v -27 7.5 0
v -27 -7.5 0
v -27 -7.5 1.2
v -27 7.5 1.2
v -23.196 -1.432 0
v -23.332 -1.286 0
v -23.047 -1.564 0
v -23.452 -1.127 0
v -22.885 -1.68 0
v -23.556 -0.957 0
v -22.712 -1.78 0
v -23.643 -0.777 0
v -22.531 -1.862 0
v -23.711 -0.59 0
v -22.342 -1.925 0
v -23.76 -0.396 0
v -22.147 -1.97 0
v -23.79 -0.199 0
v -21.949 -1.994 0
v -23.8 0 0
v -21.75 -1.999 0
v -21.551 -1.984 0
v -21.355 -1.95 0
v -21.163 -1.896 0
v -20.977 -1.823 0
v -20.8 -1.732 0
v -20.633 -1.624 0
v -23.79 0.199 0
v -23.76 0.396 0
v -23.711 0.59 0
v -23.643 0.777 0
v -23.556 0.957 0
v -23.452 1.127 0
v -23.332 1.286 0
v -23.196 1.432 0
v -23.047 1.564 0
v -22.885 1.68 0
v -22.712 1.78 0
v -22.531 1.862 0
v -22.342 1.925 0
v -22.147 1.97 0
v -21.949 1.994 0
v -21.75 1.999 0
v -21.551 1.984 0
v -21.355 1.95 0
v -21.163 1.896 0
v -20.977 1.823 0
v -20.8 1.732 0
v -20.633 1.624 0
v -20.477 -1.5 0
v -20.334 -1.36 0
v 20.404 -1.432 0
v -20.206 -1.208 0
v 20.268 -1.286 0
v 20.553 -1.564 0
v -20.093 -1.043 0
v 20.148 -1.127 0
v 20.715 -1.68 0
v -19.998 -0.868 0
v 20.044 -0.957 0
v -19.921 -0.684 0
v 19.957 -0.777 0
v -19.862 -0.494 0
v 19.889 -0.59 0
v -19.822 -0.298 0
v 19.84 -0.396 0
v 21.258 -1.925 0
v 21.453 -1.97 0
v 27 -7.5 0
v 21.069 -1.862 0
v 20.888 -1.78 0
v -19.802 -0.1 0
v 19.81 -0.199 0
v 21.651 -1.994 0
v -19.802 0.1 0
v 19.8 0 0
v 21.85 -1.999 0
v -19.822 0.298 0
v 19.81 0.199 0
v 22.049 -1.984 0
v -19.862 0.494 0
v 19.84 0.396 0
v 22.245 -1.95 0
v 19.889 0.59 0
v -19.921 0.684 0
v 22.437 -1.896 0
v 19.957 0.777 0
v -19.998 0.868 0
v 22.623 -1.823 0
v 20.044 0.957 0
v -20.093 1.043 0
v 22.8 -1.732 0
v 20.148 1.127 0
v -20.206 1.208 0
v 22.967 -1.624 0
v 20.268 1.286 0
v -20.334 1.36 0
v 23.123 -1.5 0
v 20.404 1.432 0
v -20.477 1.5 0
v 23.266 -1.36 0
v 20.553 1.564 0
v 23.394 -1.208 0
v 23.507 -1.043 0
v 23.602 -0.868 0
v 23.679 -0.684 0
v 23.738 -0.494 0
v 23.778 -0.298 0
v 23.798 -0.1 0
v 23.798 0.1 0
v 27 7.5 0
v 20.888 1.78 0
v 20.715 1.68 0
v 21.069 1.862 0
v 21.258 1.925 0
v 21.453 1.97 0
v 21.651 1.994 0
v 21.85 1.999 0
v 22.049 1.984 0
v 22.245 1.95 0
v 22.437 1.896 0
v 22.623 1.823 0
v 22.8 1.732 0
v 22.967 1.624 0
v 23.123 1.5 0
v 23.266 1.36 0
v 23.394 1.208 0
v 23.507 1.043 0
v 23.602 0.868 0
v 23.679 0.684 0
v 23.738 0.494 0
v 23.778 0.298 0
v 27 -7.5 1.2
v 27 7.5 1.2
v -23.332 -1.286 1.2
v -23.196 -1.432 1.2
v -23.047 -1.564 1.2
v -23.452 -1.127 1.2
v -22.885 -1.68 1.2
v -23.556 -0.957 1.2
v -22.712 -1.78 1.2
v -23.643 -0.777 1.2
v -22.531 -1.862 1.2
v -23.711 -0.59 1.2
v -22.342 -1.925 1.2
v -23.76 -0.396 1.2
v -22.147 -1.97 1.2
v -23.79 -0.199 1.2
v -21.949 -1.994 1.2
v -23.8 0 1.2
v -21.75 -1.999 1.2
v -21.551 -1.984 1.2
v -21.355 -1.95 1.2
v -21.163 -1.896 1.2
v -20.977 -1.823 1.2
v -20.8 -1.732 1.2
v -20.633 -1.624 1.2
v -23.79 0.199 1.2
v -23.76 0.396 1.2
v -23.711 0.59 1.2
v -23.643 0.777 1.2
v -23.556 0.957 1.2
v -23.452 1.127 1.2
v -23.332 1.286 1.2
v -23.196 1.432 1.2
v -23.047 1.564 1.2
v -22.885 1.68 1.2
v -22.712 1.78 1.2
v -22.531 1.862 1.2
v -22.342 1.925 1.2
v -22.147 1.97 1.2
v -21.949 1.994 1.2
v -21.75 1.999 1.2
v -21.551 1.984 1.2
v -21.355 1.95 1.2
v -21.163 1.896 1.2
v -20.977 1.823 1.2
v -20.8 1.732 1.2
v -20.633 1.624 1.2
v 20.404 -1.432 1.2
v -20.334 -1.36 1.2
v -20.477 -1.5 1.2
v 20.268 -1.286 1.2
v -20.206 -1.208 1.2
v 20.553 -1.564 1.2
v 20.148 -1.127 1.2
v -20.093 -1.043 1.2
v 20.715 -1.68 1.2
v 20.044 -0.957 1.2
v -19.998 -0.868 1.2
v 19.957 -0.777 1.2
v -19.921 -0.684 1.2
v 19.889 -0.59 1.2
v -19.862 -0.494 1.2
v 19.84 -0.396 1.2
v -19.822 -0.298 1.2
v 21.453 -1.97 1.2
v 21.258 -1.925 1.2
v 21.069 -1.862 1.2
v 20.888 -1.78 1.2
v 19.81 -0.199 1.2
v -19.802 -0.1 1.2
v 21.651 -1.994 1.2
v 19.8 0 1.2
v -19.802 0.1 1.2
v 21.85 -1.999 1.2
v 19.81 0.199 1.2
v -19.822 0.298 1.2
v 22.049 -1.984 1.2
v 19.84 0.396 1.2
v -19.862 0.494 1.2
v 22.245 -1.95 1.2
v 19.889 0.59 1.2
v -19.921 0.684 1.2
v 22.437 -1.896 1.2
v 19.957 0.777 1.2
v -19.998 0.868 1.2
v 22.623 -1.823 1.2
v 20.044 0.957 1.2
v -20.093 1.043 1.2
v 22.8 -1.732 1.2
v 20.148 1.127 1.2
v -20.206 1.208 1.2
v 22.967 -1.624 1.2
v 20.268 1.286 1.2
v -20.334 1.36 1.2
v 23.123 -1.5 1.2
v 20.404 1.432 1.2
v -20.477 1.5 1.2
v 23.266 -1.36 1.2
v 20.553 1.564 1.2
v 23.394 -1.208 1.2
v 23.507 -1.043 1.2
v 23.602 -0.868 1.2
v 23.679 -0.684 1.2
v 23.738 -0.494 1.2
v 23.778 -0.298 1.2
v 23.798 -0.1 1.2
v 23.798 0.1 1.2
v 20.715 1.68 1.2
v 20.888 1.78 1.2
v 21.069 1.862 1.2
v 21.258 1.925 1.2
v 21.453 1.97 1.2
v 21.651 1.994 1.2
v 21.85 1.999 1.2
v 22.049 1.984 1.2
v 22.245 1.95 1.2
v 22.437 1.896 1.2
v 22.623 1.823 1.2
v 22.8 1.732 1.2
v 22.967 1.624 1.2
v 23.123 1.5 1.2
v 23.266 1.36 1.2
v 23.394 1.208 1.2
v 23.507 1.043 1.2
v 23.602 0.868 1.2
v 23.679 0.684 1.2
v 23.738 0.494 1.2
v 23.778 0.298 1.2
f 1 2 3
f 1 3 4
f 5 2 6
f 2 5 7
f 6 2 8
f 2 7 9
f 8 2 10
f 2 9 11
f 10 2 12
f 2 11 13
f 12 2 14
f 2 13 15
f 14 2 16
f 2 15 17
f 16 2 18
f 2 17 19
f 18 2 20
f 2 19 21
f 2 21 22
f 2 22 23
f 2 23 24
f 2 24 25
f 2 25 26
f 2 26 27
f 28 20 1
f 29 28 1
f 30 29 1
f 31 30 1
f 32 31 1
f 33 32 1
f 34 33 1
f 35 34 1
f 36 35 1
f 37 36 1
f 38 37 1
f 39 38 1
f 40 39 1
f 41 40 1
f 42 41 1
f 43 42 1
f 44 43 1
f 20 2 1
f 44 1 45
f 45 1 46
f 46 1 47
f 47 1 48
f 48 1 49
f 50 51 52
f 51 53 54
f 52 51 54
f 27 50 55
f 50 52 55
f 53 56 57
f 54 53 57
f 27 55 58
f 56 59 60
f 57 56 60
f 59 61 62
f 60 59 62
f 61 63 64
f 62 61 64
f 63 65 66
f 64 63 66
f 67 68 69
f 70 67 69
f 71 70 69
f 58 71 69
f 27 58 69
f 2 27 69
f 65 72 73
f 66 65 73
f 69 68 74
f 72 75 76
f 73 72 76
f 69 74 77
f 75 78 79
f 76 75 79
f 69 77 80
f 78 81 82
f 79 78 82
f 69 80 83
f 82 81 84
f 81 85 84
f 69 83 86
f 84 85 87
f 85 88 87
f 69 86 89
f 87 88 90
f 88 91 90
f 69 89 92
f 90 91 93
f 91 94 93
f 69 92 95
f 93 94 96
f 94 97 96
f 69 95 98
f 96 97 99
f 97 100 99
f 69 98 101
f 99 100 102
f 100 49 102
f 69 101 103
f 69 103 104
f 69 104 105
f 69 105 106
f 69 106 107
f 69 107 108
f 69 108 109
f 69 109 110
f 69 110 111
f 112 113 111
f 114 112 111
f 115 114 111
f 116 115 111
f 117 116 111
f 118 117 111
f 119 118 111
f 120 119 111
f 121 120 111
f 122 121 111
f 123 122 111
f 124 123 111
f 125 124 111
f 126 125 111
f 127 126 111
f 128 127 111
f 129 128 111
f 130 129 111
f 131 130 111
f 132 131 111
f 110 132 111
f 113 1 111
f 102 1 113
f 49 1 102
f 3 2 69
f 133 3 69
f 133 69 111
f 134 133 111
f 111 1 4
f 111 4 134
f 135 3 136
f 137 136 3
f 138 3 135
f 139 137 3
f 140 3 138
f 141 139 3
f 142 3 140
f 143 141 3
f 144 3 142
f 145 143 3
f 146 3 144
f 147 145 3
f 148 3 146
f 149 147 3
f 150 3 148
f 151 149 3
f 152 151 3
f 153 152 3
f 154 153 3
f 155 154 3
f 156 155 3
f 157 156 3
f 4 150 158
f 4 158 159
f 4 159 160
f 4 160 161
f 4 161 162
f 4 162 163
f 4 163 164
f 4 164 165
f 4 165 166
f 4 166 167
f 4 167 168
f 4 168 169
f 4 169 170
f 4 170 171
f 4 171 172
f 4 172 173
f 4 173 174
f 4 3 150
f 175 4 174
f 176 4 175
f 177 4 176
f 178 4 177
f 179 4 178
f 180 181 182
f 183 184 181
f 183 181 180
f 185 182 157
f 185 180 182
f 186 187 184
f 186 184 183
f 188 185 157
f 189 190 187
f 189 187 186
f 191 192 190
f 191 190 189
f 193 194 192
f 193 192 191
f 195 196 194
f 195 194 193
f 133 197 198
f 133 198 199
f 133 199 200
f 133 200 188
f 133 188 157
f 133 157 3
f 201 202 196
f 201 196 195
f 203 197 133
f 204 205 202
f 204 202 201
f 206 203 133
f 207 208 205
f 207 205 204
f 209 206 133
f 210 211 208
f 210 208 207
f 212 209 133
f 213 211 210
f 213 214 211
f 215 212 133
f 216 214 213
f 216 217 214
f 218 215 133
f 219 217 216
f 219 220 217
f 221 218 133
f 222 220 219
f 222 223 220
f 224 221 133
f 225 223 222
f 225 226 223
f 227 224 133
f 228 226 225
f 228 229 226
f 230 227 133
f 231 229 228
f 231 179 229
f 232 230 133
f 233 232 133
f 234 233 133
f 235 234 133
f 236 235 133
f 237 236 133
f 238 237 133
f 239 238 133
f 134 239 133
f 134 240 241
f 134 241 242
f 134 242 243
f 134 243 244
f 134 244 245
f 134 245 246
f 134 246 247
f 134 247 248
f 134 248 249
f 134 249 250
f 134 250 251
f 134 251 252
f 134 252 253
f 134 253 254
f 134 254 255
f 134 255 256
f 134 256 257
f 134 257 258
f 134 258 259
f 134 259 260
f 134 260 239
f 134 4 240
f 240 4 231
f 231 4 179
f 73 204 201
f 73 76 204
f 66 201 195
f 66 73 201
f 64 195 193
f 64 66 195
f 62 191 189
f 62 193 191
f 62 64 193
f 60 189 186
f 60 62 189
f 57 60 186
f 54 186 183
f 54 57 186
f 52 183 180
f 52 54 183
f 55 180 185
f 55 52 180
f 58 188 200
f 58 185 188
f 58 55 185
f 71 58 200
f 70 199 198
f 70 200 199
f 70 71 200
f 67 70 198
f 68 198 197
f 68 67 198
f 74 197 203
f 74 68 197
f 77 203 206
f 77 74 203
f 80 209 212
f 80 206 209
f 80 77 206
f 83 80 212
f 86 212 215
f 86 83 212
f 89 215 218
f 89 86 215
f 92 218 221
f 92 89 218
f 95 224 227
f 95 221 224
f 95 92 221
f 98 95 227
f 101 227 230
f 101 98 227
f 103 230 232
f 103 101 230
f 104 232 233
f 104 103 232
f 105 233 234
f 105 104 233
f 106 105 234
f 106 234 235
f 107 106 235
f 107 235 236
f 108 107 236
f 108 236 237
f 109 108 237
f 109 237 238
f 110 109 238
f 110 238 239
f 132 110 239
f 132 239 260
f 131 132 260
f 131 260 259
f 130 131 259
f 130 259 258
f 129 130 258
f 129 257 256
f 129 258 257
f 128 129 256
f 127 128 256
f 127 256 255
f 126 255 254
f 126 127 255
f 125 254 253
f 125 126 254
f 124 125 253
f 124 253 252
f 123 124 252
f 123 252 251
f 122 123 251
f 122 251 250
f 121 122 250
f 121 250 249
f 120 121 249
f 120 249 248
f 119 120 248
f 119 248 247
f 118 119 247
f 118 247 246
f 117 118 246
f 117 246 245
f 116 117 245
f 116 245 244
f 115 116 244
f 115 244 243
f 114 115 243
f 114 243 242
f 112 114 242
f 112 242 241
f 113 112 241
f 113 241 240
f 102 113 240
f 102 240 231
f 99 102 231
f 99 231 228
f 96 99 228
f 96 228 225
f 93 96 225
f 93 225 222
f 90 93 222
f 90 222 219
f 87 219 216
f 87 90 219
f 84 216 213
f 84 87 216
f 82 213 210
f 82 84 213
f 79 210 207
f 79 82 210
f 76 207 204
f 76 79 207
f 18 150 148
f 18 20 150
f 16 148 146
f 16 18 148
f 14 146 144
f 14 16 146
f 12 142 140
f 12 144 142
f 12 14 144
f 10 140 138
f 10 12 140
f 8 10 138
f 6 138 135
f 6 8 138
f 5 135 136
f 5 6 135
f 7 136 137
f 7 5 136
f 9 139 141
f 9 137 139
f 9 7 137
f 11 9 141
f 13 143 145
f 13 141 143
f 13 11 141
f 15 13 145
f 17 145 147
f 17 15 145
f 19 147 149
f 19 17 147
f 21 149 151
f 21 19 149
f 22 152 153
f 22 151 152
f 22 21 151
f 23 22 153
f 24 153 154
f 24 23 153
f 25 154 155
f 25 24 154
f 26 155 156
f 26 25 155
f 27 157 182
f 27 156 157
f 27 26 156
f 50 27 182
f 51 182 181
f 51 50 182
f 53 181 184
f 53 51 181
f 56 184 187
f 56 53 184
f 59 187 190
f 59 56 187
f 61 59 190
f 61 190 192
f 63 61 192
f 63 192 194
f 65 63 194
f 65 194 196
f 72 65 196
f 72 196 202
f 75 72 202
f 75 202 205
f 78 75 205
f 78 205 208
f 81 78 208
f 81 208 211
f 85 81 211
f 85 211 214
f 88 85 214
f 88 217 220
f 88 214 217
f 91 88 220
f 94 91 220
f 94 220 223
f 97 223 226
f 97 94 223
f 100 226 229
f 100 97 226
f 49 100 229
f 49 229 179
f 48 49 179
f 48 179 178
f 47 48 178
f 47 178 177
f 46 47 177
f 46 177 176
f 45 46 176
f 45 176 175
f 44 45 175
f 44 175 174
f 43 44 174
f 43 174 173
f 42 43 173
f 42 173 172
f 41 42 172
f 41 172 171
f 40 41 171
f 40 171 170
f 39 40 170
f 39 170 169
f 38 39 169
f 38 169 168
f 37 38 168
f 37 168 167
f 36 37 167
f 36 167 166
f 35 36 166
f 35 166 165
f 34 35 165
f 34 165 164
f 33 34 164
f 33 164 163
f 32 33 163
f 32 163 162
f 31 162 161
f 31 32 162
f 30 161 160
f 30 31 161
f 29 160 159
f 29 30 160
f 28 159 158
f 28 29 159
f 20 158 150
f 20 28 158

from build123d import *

# Parameters (mm, degrees)
ESBO_O1_W                  = 54
ESBO_O1_H                  = 15
RESSALTO_EXTRUS_O1_DEPTH   = 1.2
CORTE_EXTRUS_O1_DEPTH      = 5
CORTE_EXTRUS_O1_DEPTH_BACK = 1.2
ESBO_O2_R                  = 2


with BuildPart() as part:
    # Esboço1 → Ressalto-extrusão1 (new body)
    with BuildSketch(Plane.XY):
        Rectangle(ESBO_O1_W, ESBO_O1_H)
    extrude(amount=RESSALTO_EXTRUS_O1_DEPTH)

    # Esboço2 → Corte-extrusão1 (cut, two sides: drawn at the far end of the back side and taken through both)
    with BuildSketch(Plane.XY.offset(-CORTE_EXTRUS_O1_DEPTH_BACK)):
        with Locations(Location((-21.8, 0, 0), (0, 0, 180))):
            Circle(ESBO_O2_R)
        with Locations(Location((21.8, 0, 0), (0, 0, 180))):
            Circle(ESBO_O2_R)
    extrude(amount=CORTE_EXTRUS_O1_DEPTH + CORTE_EXTRUS_O1_DEPTH_BACK, mode=Mode.SUBTRACT)


solid = part.part
